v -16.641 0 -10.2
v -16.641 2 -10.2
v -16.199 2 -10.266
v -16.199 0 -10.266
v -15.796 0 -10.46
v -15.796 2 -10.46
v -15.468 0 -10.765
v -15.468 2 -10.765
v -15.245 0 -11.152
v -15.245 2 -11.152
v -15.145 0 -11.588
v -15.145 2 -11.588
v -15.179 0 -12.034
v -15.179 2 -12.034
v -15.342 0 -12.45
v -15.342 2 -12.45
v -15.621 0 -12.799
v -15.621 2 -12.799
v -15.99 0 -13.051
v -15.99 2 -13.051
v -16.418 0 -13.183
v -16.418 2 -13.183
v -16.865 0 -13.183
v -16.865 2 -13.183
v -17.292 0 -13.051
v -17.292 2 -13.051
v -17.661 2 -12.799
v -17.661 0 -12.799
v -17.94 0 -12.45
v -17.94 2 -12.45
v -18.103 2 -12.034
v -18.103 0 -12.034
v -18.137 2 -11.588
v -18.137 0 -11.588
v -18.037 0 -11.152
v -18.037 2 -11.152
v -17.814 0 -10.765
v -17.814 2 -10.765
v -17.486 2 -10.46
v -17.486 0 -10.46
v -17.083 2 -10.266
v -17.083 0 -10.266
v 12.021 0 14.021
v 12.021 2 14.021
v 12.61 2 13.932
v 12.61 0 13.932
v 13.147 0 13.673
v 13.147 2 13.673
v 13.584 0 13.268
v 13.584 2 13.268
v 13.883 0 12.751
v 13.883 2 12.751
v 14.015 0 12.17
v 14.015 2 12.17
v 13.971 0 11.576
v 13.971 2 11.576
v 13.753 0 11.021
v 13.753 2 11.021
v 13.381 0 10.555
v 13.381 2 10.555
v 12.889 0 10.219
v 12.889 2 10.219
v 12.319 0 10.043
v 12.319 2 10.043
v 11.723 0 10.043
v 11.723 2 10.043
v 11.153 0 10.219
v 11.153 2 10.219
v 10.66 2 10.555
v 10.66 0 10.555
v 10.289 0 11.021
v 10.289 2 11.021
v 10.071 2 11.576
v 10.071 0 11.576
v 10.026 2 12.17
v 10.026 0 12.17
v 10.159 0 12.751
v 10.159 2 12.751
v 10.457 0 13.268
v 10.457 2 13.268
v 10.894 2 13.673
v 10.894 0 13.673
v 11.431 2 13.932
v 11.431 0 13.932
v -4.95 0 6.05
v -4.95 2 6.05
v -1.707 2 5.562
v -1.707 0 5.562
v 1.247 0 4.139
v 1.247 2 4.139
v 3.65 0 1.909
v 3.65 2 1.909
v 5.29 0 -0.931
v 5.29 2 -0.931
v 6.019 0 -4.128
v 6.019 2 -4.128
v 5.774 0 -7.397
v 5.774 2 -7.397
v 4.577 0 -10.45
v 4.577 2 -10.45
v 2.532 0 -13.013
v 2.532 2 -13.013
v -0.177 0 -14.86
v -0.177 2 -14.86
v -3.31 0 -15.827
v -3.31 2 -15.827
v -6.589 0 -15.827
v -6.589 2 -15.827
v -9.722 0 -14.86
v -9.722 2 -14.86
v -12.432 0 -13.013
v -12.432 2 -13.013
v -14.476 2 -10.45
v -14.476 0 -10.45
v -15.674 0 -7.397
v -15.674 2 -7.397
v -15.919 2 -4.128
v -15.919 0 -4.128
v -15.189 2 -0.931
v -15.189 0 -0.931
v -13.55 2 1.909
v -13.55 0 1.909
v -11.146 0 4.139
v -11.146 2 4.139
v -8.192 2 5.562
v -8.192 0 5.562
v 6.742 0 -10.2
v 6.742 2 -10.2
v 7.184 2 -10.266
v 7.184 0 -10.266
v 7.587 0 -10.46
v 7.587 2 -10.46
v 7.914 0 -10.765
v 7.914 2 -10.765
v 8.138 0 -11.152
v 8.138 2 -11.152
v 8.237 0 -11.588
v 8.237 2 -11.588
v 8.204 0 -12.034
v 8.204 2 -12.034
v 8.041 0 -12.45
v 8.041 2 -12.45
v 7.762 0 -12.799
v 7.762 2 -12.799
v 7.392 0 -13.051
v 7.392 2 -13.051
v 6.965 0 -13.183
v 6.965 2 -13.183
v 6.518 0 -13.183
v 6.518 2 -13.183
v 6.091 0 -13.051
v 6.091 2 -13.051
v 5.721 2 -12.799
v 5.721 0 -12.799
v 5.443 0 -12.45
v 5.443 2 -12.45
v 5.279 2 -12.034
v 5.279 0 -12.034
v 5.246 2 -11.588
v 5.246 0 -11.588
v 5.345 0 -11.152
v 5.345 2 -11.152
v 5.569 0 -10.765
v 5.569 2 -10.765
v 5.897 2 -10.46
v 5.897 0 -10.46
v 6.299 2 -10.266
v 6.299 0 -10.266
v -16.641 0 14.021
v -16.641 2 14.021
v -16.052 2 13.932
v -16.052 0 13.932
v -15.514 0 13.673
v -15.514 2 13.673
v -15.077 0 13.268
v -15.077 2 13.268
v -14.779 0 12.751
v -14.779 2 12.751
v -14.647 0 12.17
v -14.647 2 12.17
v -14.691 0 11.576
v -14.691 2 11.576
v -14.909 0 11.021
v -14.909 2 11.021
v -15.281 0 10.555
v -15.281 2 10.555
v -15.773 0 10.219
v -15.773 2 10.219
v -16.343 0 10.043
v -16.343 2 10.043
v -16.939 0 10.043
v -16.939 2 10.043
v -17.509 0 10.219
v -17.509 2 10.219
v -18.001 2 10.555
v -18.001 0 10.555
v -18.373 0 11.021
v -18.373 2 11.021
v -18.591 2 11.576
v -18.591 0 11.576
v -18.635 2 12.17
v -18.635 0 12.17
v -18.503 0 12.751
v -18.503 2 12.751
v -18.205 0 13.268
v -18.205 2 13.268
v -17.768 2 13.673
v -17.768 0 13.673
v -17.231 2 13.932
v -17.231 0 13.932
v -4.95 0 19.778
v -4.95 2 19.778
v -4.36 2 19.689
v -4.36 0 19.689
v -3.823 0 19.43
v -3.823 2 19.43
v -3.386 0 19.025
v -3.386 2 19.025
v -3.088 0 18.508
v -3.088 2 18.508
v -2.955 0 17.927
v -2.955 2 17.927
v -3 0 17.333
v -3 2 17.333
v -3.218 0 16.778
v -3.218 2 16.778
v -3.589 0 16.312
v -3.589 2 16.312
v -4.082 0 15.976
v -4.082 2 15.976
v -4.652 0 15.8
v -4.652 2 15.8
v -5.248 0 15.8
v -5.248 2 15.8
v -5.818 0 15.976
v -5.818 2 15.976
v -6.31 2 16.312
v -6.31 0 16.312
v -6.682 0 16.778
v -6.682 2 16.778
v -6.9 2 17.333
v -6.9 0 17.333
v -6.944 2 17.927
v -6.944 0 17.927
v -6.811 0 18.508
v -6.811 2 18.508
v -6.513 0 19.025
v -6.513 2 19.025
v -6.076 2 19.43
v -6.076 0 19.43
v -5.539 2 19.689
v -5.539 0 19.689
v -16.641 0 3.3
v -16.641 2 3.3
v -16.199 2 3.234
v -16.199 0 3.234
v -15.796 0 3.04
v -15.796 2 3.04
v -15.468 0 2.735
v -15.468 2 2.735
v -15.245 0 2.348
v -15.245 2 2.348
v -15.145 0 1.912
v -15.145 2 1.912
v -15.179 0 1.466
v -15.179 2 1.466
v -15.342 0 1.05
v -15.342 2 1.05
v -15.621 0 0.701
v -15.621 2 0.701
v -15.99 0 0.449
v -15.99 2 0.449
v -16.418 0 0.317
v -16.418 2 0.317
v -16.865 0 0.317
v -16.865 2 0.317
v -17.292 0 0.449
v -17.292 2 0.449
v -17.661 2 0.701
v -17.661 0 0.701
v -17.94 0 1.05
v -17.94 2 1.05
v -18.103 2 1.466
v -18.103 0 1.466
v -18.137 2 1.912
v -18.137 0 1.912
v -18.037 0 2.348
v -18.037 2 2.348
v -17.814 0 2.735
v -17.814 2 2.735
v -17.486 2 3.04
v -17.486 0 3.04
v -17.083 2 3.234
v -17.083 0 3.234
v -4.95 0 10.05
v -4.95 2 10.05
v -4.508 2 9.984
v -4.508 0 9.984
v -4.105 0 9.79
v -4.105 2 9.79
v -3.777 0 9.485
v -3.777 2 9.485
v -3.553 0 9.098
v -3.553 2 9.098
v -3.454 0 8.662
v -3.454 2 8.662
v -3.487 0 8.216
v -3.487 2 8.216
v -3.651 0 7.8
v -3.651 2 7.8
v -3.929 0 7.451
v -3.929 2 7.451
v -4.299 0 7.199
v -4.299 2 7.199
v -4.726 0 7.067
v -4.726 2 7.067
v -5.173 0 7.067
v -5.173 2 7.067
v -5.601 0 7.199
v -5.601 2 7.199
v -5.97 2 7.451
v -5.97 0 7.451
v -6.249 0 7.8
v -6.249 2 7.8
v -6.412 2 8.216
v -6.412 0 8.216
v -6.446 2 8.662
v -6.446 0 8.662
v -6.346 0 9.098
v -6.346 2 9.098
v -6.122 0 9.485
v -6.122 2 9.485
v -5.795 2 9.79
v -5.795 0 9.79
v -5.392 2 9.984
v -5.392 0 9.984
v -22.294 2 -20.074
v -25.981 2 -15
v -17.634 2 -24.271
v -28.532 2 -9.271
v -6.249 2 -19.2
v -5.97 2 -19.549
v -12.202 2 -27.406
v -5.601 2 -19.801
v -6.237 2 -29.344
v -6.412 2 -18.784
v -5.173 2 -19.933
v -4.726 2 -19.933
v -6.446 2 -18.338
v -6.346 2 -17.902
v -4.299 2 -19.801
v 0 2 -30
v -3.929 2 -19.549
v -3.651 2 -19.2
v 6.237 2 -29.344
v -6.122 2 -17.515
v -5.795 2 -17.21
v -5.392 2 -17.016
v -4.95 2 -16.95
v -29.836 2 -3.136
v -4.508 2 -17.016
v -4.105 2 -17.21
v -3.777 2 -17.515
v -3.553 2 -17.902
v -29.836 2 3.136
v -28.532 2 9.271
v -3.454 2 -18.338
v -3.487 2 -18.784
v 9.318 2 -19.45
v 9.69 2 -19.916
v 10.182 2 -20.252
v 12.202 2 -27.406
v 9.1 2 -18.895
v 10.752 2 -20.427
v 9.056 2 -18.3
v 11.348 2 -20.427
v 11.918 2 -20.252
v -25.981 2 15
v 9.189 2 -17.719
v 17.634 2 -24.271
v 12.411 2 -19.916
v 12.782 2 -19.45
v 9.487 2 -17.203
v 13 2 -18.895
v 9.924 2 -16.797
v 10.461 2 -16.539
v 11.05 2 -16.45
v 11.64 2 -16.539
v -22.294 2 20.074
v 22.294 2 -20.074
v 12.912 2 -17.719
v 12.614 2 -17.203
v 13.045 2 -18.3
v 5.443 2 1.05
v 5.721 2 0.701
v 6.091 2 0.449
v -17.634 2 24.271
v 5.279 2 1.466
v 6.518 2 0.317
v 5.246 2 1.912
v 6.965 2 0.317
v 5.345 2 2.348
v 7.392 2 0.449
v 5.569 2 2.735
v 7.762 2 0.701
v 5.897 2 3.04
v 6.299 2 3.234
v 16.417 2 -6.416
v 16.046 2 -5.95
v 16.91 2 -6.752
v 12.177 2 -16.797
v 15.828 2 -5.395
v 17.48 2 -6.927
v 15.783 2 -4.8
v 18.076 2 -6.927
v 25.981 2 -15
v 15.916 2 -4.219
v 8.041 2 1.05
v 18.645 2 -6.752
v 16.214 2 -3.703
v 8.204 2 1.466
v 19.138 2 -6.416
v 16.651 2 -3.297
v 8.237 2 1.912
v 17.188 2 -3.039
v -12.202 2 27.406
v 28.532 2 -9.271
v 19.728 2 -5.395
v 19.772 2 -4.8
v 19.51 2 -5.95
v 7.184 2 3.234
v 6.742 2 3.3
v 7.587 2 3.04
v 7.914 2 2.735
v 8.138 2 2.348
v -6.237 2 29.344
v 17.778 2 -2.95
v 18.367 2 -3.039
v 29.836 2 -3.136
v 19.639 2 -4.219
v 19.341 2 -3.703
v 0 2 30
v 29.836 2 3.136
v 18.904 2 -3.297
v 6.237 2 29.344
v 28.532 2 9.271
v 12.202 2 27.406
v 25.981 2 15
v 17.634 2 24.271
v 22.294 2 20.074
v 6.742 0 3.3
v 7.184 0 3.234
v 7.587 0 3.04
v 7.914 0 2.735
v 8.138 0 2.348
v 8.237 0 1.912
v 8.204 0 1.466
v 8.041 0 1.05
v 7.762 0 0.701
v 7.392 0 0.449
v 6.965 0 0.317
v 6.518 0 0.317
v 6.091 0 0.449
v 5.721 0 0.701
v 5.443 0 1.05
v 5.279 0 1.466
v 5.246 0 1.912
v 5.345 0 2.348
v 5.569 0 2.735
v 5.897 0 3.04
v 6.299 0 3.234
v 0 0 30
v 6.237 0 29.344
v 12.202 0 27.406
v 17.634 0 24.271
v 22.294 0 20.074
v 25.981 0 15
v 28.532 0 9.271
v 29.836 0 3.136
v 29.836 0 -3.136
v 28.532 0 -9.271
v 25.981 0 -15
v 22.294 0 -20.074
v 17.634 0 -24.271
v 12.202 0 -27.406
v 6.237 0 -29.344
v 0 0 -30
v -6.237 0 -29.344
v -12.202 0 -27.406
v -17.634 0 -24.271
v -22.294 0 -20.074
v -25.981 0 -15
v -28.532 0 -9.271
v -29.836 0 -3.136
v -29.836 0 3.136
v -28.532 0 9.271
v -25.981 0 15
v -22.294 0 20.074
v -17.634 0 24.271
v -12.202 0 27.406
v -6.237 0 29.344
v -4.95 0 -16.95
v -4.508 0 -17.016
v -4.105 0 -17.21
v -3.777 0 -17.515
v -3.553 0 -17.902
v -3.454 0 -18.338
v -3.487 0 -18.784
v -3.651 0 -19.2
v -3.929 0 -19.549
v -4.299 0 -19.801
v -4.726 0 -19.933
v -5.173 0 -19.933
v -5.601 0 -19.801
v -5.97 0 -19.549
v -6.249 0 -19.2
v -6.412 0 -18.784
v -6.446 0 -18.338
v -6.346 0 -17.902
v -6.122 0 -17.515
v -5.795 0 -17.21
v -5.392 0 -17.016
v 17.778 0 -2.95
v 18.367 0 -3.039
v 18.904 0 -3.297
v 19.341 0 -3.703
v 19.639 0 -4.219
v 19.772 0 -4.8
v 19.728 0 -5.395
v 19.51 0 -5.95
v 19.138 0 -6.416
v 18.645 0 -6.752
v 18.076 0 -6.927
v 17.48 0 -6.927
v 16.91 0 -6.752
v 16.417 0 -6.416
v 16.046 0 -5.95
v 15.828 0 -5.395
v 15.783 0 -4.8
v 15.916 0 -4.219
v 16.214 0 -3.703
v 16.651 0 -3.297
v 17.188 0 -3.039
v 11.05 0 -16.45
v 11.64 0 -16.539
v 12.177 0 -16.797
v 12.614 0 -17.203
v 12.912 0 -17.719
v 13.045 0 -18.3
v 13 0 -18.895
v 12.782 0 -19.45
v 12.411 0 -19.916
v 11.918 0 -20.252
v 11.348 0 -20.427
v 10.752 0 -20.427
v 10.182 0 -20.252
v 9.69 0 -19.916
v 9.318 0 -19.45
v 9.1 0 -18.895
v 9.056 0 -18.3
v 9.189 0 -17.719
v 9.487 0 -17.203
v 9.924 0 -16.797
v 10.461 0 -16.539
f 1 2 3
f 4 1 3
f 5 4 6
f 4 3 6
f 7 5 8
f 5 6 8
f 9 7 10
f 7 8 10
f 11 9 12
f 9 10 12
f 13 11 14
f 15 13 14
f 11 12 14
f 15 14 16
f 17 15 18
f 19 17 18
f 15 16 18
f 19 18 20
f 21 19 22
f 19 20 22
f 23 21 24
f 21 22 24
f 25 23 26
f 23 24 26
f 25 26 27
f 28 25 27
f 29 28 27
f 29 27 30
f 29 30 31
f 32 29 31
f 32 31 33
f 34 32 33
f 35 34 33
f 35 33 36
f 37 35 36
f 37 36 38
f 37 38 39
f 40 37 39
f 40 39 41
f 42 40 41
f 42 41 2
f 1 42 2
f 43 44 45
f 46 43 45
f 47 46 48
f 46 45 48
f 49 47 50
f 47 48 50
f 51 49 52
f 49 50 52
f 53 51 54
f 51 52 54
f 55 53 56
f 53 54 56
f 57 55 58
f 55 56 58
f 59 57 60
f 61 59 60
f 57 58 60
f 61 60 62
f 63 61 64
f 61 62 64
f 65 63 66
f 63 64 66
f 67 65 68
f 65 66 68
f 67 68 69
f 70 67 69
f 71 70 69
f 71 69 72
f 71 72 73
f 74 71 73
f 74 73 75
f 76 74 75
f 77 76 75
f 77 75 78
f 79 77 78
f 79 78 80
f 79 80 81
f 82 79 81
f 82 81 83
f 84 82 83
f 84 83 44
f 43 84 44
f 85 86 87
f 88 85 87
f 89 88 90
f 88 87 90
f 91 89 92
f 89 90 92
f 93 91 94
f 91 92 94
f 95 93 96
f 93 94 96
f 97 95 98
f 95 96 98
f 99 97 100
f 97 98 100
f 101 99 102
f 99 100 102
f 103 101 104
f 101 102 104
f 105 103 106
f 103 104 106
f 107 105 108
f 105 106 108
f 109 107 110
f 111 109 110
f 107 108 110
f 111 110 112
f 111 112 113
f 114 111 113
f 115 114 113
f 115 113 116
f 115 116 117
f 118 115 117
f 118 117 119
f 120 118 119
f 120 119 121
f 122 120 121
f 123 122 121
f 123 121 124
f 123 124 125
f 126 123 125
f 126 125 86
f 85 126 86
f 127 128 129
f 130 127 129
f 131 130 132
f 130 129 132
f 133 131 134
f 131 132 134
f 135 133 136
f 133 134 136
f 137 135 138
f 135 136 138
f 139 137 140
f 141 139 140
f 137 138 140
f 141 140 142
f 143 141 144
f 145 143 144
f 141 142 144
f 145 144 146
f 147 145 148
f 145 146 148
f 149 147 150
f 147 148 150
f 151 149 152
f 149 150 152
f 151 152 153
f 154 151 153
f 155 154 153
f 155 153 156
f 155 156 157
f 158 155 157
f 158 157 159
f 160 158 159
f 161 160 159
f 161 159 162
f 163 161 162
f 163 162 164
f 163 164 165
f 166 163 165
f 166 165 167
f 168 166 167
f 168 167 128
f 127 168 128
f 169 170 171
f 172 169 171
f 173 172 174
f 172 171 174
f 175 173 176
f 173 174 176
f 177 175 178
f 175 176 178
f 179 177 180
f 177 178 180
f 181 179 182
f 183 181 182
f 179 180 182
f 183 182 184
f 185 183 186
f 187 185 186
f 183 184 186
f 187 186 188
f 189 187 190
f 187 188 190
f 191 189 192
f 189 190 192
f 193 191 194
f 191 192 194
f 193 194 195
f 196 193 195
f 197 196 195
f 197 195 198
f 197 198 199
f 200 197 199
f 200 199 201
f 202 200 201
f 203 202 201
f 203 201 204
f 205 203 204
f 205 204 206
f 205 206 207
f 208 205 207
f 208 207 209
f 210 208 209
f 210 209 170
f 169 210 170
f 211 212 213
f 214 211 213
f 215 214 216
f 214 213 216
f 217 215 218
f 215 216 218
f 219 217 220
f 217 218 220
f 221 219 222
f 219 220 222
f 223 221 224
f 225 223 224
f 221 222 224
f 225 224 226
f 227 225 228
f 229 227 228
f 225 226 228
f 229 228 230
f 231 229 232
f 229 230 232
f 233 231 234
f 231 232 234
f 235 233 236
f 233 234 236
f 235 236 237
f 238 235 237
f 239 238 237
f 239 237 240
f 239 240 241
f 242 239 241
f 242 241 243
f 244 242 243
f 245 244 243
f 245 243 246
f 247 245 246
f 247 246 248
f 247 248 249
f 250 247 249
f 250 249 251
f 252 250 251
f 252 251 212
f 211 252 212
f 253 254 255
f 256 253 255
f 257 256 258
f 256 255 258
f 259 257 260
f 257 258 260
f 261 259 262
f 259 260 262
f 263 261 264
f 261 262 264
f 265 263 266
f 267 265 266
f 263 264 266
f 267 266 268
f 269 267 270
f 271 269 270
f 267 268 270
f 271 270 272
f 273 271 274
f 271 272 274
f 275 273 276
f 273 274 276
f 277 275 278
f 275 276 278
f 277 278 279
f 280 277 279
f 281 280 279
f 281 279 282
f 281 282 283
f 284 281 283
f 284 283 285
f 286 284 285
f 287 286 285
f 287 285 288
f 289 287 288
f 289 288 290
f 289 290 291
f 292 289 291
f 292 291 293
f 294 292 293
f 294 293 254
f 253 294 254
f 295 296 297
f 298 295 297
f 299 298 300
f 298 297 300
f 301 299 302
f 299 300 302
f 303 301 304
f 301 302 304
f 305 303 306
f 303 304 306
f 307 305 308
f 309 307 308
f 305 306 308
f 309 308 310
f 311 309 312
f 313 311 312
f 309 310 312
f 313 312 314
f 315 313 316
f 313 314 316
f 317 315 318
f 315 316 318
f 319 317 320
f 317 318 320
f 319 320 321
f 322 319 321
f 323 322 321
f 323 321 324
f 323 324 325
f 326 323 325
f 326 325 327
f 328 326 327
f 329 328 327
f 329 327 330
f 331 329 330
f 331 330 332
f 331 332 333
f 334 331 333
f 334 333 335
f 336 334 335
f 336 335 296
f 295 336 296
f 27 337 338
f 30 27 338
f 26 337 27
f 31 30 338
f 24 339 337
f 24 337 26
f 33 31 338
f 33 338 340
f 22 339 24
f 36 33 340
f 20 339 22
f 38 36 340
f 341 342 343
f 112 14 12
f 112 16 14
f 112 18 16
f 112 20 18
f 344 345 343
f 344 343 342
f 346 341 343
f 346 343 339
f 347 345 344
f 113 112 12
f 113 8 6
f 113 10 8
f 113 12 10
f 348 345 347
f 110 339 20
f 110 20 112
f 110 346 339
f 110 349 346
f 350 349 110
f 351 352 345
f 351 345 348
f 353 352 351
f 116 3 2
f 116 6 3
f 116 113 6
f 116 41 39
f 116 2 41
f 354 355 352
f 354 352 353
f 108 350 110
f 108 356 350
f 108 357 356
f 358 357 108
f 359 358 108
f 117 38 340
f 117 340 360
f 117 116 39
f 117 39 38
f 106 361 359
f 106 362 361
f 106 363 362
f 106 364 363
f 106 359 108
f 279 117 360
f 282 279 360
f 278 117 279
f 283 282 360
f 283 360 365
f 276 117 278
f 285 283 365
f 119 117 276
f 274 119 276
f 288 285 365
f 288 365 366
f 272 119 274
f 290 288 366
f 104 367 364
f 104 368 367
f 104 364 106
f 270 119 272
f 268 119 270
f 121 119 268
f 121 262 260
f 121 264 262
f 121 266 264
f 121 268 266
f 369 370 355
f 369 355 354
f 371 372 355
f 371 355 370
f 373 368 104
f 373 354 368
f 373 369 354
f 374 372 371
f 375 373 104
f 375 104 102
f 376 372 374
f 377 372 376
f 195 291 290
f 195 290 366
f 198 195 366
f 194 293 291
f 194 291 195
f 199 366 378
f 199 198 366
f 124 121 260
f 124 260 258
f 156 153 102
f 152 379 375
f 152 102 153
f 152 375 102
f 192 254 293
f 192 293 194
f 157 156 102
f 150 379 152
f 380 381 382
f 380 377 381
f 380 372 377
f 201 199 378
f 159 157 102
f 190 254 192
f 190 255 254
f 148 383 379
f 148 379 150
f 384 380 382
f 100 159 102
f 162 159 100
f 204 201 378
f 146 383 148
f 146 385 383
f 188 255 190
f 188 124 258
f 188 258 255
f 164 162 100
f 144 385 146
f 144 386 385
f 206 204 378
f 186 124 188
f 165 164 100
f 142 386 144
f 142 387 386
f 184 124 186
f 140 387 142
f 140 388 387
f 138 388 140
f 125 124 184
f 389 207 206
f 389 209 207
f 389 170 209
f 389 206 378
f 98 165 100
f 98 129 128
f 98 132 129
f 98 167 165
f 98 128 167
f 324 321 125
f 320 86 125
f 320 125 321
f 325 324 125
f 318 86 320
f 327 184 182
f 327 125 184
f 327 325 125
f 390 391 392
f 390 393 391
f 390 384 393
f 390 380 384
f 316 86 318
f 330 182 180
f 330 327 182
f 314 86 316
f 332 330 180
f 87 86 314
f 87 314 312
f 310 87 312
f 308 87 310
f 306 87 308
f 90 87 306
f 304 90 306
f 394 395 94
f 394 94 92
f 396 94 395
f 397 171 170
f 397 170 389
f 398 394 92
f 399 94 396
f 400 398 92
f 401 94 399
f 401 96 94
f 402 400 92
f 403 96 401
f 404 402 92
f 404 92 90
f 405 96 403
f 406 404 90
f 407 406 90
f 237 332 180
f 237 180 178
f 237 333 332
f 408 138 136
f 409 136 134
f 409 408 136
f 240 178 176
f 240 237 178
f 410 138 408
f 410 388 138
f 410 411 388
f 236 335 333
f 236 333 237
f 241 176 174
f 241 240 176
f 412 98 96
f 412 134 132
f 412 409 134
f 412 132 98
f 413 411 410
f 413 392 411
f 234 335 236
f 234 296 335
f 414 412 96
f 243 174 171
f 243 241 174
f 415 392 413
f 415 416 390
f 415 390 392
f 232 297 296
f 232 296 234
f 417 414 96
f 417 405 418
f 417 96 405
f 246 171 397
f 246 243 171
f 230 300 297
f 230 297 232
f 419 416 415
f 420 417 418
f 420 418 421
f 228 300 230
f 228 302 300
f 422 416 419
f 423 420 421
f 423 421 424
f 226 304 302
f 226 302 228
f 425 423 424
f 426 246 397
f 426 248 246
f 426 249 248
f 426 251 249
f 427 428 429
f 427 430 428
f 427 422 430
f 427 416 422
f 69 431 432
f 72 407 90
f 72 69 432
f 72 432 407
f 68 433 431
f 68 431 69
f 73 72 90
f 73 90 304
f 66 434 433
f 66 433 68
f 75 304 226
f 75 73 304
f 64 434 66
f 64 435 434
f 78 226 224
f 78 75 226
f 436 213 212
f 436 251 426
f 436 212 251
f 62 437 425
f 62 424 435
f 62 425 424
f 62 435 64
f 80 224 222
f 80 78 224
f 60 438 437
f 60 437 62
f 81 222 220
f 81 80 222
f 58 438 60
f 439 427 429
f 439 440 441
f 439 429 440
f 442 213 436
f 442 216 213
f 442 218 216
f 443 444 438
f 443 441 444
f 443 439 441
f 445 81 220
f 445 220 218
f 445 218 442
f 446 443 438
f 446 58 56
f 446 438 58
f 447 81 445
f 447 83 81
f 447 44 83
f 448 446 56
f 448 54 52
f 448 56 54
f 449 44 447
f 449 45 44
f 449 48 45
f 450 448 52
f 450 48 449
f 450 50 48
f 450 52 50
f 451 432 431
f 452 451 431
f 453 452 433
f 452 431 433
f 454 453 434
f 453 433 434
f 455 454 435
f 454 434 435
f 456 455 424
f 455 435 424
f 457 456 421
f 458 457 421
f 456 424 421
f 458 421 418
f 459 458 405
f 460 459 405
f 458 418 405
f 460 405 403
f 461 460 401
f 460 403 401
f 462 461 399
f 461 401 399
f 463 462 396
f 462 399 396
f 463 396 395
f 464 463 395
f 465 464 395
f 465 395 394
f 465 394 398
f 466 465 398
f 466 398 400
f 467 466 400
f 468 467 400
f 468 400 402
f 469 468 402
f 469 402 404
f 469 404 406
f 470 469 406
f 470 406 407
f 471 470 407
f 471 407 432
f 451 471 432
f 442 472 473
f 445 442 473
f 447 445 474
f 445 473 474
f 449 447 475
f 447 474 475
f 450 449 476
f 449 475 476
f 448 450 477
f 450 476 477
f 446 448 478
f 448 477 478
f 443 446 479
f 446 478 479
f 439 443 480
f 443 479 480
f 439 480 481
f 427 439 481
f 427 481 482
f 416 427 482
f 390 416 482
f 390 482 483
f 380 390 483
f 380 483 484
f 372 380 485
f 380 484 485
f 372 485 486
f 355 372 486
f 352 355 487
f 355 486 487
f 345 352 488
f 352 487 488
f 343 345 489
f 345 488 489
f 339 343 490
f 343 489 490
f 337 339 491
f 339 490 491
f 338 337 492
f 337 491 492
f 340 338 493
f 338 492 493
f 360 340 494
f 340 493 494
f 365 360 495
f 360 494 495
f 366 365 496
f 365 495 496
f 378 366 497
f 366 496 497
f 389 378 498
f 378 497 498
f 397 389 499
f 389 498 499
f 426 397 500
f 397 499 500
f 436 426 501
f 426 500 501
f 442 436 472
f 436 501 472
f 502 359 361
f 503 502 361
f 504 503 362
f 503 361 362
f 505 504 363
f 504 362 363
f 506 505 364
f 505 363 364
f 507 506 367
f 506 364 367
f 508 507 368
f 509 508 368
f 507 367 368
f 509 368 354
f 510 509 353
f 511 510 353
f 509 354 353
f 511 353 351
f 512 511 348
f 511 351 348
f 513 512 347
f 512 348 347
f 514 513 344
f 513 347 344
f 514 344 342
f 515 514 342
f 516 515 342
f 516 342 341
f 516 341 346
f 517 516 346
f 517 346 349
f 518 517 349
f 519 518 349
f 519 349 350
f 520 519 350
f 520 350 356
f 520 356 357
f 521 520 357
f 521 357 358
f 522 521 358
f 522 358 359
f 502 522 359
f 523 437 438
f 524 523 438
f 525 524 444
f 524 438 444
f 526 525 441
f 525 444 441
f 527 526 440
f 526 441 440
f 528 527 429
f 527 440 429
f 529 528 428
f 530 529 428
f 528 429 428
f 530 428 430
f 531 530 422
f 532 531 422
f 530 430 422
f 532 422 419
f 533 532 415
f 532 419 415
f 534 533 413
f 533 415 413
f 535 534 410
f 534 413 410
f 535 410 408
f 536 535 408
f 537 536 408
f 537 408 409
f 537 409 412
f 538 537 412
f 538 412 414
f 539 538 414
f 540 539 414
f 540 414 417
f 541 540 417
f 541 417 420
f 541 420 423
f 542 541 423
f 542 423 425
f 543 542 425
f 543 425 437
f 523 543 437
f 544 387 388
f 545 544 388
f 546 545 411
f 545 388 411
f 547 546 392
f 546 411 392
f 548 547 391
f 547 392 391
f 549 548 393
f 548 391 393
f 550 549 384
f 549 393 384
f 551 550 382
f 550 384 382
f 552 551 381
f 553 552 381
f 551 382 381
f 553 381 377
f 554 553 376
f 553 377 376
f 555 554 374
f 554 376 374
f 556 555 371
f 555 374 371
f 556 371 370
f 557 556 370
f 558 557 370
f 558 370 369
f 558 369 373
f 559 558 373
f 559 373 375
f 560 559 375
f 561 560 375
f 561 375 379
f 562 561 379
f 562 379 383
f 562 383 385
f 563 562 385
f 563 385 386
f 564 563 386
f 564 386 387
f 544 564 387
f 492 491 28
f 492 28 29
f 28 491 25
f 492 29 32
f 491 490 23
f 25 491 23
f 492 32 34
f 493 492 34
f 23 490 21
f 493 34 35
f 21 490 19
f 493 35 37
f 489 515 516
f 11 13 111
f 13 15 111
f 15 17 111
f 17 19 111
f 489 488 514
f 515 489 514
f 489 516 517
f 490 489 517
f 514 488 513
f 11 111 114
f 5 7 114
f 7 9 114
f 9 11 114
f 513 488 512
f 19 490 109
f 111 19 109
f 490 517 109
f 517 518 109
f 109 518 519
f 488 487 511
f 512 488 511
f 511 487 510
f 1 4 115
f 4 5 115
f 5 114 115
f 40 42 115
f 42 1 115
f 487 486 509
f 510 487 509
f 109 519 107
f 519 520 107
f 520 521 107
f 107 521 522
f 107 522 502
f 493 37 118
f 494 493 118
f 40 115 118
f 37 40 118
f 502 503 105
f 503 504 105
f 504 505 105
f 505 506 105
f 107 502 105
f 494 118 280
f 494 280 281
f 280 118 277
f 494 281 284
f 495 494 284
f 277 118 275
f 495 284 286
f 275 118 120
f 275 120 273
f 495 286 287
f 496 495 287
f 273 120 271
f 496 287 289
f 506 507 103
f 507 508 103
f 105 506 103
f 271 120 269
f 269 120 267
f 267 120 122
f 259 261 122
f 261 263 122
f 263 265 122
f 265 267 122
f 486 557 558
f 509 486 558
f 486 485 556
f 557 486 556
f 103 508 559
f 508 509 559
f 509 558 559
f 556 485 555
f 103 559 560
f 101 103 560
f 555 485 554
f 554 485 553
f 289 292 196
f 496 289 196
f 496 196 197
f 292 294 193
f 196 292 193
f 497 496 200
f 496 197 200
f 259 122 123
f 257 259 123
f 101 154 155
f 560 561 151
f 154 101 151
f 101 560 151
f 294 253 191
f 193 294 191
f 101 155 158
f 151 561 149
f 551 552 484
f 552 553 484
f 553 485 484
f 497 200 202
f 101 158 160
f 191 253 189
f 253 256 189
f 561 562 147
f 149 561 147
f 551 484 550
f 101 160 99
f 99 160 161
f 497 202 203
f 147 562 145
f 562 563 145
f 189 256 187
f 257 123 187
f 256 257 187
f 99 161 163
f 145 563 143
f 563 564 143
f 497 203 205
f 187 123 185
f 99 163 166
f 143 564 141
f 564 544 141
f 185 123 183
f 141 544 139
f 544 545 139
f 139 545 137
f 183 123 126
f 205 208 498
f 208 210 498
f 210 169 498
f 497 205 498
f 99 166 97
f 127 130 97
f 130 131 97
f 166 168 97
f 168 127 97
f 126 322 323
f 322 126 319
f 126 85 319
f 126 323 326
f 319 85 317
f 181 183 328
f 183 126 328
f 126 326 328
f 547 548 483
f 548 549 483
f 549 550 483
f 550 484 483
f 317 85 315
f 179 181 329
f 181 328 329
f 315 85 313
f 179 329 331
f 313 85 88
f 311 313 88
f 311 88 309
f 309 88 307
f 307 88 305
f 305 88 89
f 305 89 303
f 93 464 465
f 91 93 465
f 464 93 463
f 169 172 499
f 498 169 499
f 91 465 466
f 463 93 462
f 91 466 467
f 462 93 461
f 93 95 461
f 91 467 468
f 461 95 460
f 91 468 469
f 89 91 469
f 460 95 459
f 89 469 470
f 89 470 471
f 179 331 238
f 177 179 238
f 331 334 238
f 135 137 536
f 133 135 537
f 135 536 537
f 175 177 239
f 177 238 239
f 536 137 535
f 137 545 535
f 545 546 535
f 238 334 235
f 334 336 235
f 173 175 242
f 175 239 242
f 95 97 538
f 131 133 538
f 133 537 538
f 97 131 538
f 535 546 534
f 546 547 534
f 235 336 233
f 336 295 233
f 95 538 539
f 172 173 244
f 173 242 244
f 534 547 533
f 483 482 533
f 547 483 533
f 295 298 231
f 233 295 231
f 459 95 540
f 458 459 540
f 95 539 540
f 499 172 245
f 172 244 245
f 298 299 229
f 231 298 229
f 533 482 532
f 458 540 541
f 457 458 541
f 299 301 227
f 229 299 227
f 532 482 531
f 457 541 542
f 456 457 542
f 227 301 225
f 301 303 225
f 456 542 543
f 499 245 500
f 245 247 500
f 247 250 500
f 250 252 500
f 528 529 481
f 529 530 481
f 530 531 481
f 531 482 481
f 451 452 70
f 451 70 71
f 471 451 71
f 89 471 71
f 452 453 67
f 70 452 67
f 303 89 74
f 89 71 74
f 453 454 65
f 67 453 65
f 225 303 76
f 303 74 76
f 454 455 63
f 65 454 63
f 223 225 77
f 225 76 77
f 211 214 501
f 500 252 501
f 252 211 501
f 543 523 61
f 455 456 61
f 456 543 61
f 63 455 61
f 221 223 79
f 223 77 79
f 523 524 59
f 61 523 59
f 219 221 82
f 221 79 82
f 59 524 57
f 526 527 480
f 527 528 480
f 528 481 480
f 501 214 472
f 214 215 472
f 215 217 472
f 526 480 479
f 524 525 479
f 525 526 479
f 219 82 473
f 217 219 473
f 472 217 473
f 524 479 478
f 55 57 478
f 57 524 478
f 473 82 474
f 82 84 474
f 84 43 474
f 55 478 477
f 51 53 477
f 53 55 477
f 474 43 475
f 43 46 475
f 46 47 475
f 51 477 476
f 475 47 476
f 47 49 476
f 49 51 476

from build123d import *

# Parameters (mm, degrees)
SKETCH1_R           = 30
BOSS_EXTRUDE1_DEPTH = 2
CUT_EXTRUDE3_REACH  = 44.474
SKETCH4_R           = 11
SKETCH4_R_2         = 1.5
SKETCH4_R_3         = 2


with BuildPart() as part:
    # Sketch1 → Boss-Extrude1 (new body)
    with BuildSketch(Plane(origin=(0, 0, 0), x_dir=(1, 0, 0), z_dir=(0, 1, 0))):
        with Locations(Location((0, 0, 0), (0, 0, 270))):
            Circle(SKETCH1_R)
    extrude(amount=BOSS_EXTRUDE1_DEPTH)

    # Sketch4 → Cut-Extrude3 (cut, up to next)
    with BuildSketch(Plane(origin=(0, 2, 0), x_dir=(1, 0, 0), z_dir=(0, 1, 0)), mode=Mode.PRIVATE) as cut_extrude3_sk1:
        with Locations(Location((-4.949747468, 4.949747468, 0), (0, 0, 270))):
            Circle(SKETCH4_R)
    cut_extrude3_tool1 = extrude(cut_extrude3_sk1.sketch, amount=-CUT_EXTRUDE3_REACH, mode=Mode.PRIVATE) & part.part
    # Sketch4 → Cut-Extrude3 (cut, up to next)
    with BuildSketch(Plane(origin=(0, 2, 0), x_dir=(1, 0, 0), z_dir=(0, 1, 0)), mode=Mode.PRIVATE) as cut_extrude3_sk2:
        with Locations(Location((-4.949747468, 18.449747468, 0), (0, 0, 270))):
            Circle(SKETCH4_R_2)
    cut_extrude3_tool2 = extrude(cut_extrude3_sk2.sketch, amount=-CUT_EXTRUDE3_REACH, mode=Mode.PRIVATE) & part.part
    # Sketch4 → Cut-Extrude3 (cut, up to next)
    with BuildSketch(Plane(origin=(0, 2, 0), x_dir=(1, 0, 0), z_dir=(0, 1, 0)), mode=Mode.PRIVATE) as cut_extrude3_sk3:
        with Locations(Location((6.741595483, 11.699747468, 0), (0, 0, 270))):
            Circle(SKETCH4_R_2)
    cut_extrude3_tool3 = extrude(cut_extrude3_sk3.sketch, amount=-CUT_EXTRUDE3_REACH, mode=Mode.PRIVATE) & part.part
    # Sketch4 → Cut-Extrude3 (cut, up to next)
    with BuildSketch(Plane(origin=(0, 2, 0), x_dir=(1, 0, 0), z_dir=(0, 1, 0)), mode=Mode.PRIVATE) as cut_extrude3_sk4:
        with Locations(Location((6.741595483, -1.800252532, 0), (0, 0, 270))):
            Circle(SKETCH4_R_2)
    cut_extrude3_tool4 = extrude(cut_extrude3_sk4.sketch, amount=-CUT_EXTRUDE3_REACH, mode=Mode.PRIVATE) & part.part
    # Sketch4 → Cut-Extrude3 (cut, up to next)
    with BuildSketch(Plane(origin=(0, 2, 0), x_dir=(1, 0, 0), z_dir=(0, 1, 0)), mode=Mode.PRIVATE) as cut_extrude3_sk5:
        with Locations(Location((-4.949747468, -8.550252532, 0), (0, 0, 270))):
            Circle(SKETCH4_R_2)
    cut_extrude3_tool5 = extrude(cut_extrude3_sk5.sketch, amount=-CUT_EXTRUDE3_REACH, mode=Mode.PRIVATE) & part.part
    # Sketch4 → Cut-Extrude3 (cut, up to next)
    with BuildSketch(Plane(origin=(0, 2, 0), x_dir=(1, 0, 0), z_dir=(0, 1, 0)), mode=Mode.PRIVATE) as cut_extrude3_sk6:
        with Locations(Location((-16.641090419, -1.800252532, 0), (0, 0, 270))):
            Circle(SKETCH4_R_2)
    cut_extrude3_tool6 = extrude(cut_extrude3_sk6.sketch, amount=-CUT_EXTRUDE3_REACH, mode=Mode.PRIVATE) & part.part
    # Sketch4 → Cut-Extrude3 (cut, up to next)
    with BuildSketch(Plane(origin=(0, 2, 0), x_dir=(1, 0, 0), z_dir=(0, 1, 0)), mode=Mode.PRIVATE) as cut_extrude3_sk7:
        with Locations(Location((-16.641090419, 11.699747468, 0), (0, 0, 270))):
            Circle(SKETCH4_R_2)
    cut_extrude3_tool7 = extrude(cut_extrude3_sk7.sketch, amount=-CUT_EXTRUDE3_REACH, mode=Mode.PRIVATE) & part.part
    # Sketch4 → Cut-Extrude3 (cut, up to next)
    with BuildSketch(Plane(origin=(0, 2, 0), x_dir=(1, 0, 0), z_dir=(0, 1, 0)), mode=Mode.PRIVATE) as cut_extrude3_sk8:
        with Locations(Location((-4.949747468, -17.777677021, 0), (0, 0, 270))):
            Circle(SKETCH4_R_3)
    cut_extrude3_tool8 = extrude(cut_extrude3_sk8.sketch, amount=-CUT_EXTRUDE3_REACH, mode=Mode.PRIVATE) & part.part
    # Sketch4 → Cut-Extrude3 (cut, up to next)
    with BuildSketch(Plane(origin=(0, 2, 0), x_dir=(1, 0, 0), z_dir=(0, 1, 0)), mode=Mode.PRIVATE) as cut_extrude3_sk9:
        with Locations(Location((12.02081528, -12.02081528, 0), (0, 0, 270))):
            Circle(SKETCH4_R_3)
    cut_extrude3_tool9 = extrude(cut_extrude3_sk9.sketch, amount=-CUT_EXTRUDE3_REACH, mode=Mode.PRIVATE) & part.part
    # Sketch4 → Cut-Extrude3 (cut, up to next)
    with BuildSketch(Plane(origin=(0, 2, 0), x_dir=(1, 0, 0), z_dir=(0, 1, 0)), mode=Mode.PRIVATE) as cut_extrude3_sk10:
        with Locations(Location((17.777677021, 4.949747468, 0), (0, 0, 270))):
            Circle(SKETCH4_R_3)
    cut_extrude3_tool10 = extrude(cut_extrude3_sk10.sketch, amount=-CUT_EXTRUDE3_REACH, mode=Mode.PRIVATE) & part.part
    # Sketch4 → Cut-Extrude3 (cut, up to next)
    with BuildSketch(Plane(origin=(0, 2, 0), x_dir=(1, 0, 0), z_dir=(0, 1, 0)), mode=Mode.PRIVATE) as cut_extrude3_sk11:
        with Locations(Location((11.050252532, 18.449747468, 0), (0, 0, 270))):
            Circle(SKETCH4_R_3)
    cut_extrude3_tool11 = extrude(cut_extrude3_sk11.sketch, amount=-CUT_EXTRUDE3_REACH, mode=Mode.PRIVATE) & part.part
    # Sketch4 → Cut-Extrude3 (cut, up to next)
    with BuildSketch(Plane(origin=(0, 2, 0), x_dir=(1, 0, 0), z_dir=(0, 1, 0)), mode=Mode.PRIVATE) as cut_extrude3_sk12:
        with Locations(Location((-16.641090419, -12.02081528, 0), (0, 0, 270))):
            Circle(SKETCH4_R_3)
    cut_extrude3_tool12 = extrude(cut_extrude3_sk12.sketch, amount=-CUT_EXTRUDE3_REACH, mode=Mode.PRIVATE) & part.part
    add(cut_extrude3_tool1.solids().sort_by_distance((-4.949747, 2, -4.949747))[0], mode=Mode.SUBTRACT)
    add(cut_extrude3_tool2.solids().sort_by_distance((-4.949747, 2, -18.449747))[0], mode=Mode.SUBTRACT)
    add(cut_extrude3_tool3.solids().sort_by_distance((6.741595, 2, -11.699747))[0], mode=Mode.SUBTRACT)
    add(cut_extrude3_tool4.solids().sort_by_distance((6.741595, 2, 1.800253))[0], mode=Mode.SUBTRACT)
    add(cut_extrude3_tool5.solids().sort_by_distance((-4.949747, 2, 8.550253))[0], mode=Mode.SUBTRACT)
    add(cut_extrude3_tool6.solids().sort_by_distance((-16.64109, 2, 1.800253))[0], mode=Mode.SUBTRACT)
    add(cut_extrude3_tool7.solids().sort_by_distance((-16.64109, 2, -11.699747))[0], mode=Mode.SUBTRACT)
    add(cut_extrude3_tool8.solids().sort_by_distance((-4.949747, 2, 17.777677))[0], mode=Mode.SUBTRACT)
    add(cut_extrude3_tool9.solids().sort_by_distance((12.020815, 2, 12.020815))[0], mode=Mode.SUBTRACT)
    add(cut_extrude3_tool10.solids().sort_by_distance((17.777677, 2, -4.949747))[0], mode=Mode.SUBTRACT)
    add(cut_extrude3_tool11.solids().sort_by_distance((11.050253, 2, -18.449747))[0], mode=Mode.SUBTRACT)
    add(cut_extrude3_tool12.solids().sort_by_distance((-16.64109, 2, 12.020815))[0], mode=Mode.SUBTRACT)


solid = part.part
